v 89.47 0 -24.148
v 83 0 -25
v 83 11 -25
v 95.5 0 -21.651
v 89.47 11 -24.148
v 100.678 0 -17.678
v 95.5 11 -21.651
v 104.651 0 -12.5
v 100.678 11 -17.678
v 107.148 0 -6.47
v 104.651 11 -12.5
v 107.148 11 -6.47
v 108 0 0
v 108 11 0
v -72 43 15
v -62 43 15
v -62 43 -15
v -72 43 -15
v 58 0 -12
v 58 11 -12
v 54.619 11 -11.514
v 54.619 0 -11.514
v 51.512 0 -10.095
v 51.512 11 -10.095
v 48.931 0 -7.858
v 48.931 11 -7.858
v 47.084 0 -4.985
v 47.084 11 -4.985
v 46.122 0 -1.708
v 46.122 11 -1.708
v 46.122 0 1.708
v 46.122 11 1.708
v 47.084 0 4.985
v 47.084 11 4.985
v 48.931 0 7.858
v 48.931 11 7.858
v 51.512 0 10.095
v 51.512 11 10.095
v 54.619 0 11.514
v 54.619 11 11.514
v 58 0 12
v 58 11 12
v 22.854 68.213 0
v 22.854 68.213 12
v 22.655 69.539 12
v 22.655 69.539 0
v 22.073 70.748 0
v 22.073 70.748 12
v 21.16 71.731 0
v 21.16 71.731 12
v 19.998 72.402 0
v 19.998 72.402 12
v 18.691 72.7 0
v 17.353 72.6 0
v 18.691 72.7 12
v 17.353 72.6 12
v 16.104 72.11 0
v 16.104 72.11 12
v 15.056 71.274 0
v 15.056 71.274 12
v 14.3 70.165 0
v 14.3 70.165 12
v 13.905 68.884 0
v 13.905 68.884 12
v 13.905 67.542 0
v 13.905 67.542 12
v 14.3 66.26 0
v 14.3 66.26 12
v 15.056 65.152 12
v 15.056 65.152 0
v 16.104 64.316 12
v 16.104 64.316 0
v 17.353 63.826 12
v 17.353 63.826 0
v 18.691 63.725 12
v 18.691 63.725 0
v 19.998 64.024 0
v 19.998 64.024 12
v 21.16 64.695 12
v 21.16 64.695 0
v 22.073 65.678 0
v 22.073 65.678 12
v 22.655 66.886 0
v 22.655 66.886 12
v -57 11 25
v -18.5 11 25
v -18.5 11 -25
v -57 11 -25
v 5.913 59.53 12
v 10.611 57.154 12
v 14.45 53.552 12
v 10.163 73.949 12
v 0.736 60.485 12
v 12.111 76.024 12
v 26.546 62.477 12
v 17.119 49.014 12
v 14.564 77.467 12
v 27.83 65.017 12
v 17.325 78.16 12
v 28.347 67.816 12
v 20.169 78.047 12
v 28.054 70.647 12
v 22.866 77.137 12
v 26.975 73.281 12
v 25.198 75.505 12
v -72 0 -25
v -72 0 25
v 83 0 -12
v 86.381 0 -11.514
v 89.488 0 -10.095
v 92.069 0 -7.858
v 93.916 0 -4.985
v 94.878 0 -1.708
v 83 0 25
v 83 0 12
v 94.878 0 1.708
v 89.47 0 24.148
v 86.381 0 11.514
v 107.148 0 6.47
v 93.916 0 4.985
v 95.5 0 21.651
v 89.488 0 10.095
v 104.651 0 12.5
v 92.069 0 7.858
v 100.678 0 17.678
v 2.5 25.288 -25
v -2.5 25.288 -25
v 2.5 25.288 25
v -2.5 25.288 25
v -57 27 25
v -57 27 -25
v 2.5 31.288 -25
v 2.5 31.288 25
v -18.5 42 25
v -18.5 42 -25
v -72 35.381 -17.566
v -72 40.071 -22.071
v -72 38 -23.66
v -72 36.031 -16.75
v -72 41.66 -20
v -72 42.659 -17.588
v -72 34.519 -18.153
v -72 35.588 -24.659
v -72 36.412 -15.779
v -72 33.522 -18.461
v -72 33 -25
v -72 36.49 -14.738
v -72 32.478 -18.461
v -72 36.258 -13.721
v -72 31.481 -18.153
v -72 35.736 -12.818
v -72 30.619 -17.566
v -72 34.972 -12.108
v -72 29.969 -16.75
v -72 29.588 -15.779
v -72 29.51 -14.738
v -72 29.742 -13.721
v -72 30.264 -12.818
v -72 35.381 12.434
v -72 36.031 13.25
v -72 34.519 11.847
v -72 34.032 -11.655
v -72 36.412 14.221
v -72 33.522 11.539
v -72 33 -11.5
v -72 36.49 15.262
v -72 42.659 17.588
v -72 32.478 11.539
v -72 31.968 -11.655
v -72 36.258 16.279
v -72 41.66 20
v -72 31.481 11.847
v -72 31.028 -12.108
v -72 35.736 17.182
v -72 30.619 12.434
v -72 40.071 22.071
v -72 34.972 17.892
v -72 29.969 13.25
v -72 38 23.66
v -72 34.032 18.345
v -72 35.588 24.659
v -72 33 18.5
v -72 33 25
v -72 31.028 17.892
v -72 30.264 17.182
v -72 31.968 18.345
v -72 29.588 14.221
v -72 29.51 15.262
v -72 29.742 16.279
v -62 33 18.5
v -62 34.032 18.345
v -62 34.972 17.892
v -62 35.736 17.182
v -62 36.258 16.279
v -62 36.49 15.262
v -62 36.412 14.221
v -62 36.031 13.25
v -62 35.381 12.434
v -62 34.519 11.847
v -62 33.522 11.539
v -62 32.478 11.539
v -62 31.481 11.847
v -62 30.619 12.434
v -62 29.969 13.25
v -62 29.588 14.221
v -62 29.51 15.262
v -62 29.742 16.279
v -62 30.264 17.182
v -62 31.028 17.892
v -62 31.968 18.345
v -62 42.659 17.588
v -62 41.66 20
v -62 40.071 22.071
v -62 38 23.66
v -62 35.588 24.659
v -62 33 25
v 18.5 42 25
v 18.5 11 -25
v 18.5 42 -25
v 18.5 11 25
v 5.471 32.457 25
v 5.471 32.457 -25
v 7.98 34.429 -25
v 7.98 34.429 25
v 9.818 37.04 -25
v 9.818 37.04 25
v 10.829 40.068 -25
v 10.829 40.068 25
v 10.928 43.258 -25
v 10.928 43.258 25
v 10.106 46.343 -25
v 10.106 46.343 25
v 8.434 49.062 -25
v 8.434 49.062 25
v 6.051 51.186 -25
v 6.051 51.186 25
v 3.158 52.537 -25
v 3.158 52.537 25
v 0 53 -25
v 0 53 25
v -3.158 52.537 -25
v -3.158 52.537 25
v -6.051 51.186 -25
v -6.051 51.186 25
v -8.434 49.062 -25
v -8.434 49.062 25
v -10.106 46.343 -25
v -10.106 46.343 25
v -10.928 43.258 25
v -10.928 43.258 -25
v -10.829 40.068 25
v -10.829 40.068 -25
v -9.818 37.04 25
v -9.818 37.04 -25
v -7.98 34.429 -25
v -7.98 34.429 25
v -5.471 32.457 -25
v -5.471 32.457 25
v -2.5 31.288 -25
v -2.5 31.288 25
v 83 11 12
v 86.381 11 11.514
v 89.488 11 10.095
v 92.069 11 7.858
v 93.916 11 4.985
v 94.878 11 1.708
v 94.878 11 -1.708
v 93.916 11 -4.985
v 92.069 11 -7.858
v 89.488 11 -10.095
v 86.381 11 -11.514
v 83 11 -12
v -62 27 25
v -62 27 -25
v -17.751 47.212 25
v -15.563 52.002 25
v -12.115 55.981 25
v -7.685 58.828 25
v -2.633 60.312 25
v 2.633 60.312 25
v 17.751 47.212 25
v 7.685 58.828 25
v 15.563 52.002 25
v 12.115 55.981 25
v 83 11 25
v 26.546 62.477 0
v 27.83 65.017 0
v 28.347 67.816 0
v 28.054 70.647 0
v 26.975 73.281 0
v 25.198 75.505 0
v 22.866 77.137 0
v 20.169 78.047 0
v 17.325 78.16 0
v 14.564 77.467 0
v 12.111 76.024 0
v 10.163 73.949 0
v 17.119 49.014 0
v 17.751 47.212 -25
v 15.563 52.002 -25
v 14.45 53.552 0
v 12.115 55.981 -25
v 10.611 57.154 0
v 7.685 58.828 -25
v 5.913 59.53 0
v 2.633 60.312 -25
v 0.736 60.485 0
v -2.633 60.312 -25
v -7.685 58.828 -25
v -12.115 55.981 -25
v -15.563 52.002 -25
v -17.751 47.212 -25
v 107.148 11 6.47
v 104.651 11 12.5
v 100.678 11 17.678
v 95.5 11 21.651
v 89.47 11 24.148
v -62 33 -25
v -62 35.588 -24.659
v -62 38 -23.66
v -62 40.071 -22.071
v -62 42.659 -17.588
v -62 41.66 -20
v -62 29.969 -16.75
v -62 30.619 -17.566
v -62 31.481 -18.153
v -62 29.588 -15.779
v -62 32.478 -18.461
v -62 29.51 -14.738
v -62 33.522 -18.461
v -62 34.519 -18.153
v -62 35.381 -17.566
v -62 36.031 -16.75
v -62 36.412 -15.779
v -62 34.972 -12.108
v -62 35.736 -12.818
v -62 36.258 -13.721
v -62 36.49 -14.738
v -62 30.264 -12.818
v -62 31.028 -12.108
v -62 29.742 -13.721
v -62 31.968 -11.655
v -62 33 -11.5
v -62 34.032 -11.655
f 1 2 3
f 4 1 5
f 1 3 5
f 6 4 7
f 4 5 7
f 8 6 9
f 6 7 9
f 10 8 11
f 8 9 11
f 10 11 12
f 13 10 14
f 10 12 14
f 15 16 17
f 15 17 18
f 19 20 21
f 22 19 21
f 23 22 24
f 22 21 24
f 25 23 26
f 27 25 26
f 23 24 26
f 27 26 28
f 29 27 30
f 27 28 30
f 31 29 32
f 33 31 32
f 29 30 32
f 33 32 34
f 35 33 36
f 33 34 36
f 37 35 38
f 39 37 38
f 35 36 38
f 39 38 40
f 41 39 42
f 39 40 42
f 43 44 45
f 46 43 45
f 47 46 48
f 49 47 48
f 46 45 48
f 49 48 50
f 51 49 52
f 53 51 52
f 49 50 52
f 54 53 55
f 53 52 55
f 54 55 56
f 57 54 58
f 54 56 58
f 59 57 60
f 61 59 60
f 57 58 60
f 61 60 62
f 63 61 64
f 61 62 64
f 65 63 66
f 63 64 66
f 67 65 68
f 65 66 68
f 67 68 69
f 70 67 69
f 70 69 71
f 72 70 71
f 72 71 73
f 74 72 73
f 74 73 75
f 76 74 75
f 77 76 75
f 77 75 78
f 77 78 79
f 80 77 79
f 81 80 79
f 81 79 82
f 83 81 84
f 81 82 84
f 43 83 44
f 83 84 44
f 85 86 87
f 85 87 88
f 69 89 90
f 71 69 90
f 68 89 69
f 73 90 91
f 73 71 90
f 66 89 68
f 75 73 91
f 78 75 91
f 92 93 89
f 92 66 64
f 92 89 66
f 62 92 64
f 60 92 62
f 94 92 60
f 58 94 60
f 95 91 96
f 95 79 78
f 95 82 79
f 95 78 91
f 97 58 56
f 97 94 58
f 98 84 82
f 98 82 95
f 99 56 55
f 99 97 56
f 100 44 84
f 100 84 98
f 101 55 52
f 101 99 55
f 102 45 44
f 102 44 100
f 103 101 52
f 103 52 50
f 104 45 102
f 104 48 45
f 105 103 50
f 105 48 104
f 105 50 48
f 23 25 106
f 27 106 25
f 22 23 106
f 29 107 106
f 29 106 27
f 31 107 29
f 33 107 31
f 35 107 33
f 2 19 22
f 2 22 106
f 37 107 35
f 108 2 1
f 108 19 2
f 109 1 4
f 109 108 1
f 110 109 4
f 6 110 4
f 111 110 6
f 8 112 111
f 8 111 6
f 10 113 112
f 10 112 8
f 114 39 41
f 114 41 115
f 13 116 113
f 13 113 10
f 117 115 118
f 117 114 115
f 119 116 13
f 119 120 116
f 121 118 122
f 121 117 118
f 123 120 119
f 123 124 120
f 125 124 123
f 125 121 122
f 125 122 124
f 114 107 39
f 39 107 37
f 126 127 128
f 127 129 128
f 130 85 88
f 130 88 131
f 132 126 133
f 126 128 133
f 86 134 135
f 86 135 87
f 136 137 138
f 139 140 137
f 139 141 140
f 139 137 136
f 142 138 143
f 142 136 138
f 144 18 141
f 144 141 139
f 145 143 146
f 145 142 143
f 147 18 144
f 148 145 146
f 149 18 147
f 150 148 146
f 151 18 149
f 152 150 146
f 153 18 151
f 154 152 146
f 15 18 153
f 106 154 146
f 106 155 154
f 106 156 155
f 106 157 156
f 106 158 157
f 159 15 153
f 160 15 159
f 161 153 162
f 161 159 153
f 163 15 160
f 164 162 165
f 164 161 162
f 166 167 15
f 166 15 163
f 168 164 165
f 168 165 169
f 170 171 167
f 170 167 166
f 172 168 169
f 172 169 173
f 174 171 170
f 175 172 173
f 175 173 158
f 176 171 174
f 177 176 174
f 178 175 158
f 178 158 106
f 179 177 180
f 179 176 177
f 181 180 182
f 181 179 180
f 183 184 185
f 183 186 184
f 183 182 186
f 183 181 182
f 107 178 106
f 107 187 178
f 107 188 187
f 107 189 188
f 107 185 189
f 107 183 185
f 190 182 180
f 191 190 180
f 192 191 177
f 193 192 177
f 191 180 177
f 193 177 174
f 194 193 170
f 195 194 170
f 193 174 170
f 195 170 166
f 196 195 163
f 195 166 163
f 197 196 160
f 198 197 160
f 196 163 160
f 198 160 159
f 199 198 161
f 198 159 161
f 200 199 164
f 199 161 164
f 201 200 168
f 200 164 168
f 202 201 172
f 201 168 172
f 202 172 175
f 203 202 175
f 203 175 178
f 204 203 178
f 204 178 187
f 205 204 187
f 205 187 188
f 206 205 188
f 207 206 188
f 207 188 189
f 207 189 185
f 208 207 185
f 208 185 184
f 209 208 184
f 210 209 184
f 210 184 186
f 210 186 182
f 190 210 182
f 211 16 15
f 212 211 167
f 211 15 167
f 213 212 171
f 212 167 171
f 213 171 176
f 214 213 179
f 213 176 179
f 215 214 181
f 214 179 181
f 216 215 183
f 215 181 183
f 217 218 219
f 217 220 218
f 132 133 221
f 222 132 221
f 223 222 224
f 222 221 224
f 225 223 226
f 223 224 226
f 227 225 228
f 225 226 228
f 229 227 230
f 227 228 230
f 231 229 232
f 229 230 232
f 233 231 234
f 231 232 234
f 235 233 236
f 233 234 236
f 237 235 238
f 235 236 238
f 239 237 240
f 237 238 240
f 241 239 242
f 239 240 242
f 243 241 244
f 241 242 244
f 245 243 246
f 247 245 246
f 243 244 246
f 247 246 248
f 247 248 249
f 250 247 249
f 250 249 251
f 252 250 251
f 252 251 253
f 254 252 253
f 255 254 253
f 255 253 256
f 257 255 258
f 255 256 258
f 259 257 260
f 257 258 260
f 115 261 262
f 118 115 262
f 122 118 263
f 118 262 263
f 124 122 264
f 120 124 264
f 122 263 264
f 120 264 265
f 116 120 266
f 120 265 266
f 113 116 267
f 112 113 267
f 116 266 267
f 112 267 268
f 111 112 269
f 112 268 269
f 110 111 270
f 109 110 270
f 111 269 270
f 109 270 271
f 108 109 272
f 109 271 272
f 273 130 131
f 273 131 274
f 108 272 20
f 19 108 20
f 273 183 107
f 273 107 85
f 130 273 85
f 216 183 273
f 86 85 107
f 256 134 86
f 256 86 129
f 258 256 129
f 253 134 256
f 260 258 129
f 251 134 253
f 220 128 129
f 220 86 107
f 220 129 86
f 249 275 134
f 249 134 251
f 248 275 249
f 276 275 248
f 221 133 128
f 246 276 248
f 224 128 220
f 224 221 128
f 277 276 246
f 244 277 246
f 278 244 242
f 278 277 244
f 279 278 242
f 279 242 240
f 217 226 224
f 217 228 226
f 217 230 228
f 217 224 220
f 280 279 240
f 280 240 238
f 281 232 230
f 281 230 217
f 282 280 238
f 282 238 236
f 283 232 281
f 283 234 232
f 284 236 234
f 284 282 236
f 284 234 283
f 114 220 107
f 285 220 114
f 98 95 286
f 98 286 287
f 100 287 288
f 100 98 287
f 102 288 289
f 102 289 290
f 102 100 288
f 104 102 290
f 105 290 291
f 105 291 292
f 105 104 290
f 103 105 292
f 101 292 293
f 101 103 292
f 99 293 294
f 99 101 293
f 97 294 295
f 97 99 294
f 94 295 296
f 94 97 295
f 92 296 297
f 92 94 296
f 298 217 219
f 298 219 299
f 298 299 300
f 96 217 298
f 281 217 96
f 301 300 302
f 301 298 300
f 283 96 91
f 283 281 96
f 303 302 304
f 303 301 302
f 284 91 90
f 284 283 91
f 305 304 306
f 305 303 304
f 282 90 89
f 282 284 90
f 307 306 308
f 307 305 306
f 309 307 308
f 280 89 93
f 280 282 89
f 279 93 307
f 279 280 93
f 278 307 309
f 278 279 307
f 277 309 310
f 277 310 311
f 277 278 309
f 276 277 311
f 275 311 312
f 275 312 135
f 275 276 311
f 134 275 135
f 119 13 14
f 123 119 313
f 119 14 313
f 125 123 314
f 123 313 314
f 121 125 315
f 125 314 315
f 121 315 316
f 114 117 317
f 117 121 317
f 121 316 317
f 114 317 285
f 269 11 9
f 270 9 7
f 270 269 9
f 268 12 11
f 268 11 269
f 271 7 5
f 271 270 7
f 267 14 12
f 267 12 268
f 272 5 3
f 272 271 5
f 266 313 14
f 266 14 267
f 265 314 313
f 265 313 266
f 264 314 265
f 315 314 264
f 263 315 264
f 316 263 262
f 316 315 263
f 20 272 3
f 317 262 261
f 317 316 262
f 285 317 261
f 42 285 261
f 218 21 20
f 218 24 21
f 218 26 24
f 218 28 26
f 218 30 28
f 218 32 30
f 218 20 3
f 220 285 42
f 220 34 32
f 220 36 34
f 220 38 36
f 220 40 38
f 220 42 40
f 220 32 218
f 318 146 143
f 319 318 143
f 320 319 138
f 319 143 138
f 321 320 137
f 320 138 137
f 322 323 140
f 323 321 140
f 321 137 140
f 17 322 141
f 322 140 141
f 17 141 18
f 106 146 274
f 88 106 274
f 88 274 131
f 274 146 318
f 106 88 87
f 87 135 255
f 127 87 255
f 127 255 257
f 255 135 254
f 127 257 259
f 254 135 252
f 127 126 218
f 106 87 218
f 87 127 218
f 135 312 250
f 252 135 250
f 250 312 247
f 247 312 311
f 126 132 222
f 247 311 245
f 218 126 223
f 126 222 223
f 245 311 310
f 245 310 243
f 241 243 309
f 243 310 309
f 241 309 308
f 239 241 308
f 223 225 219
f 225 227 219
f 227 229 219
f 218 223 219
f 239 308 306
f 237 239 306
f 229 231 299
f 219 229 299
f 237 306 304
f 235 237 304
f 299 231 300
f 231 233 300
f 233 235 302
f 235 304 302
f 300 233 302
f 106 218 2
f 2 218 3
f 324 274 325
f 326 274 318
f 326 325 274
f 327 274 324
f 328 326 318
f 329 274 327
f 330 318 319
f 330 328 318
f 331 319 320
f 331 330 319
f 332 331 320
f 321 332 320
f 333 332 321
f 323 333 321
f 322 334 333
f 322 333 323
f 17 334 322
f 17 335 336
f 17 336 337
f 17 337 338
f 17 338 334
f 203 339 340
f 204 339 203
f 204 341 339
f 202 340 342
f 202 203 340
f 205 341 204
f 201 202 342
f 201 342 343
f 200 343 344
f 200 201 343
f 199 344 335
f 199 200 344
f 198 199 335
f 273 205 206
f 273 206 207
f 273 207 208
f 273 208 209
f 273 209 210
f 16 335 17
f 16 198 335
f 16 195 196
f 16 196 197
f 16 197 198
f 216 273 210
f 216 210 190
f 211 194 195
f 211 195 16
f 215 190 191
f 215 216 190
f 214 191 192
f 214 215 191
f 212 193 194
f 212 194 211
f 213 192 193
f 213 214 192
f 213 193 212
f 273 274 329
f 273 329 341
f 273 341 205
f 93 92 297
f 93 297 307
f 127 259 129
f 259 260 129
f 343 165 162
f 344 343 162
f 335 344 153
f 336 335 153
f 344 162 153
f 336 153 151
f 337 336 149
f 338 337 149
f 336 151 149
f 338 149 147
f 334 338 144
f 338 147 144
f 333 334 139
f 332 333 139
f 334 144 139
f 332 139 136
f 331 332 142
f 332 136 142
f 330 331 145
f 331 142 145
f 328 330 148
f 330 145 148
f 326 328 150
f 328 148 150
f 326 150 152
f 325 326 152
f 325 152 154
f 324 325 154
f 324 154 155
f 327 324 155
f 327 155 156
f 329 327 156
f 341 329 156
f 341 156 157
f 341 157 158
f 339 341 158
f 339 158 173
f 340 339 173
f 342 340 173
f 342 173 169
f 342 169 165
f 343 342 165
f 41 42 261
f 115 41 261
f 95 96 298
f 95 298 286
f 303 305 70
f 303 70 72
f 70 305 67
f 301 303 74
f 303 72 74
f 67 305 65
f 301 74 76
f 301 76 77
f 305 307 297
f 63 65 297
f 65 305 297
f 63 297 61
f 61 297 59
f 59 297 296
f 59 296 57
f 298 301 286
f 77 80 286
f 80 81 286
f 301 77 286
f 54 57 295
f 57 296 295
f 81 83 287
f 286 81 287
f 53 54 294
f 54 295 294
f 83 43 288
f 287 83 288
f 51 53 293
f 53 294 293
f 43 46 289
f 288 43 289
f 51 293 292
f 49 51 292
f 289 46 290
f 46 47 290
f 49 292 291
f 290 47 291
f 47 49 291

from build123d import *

# Parameters (mm, degrees)
BOSS_EXTRUDE1_DEPTH = 25
SKETCH1_3_R         = 4.5
BOSS_EXTRUDE2_DEPTH = 12
CUT_EXTRUDE1_REACH  = 131.64
CUT_EXTRUDE2_REACH  = 199.844
SKETCH3_R           = 3.5


with BuildPart() as part:
    # Sketch1 → Boss-Extrude1 (new, symmetric)
    with BuildSketch(Plane.XY):
        with BuildLine():
            Line((-72, 43), (-72, 0))
            Line((-72, 0), (108, 0))
            Line((108, 0), (108, 11))
            Line((108, 11), (18.5, 11))
            Line((18.5, 11), (18.5, 42))
            ThreePointArc((18.5, 42), (18.151437184, 45.574259105), (17.118883443, 49.013831311))
            ThreePointArc((17.118883443, 49.013831311), (10.611164072, 57.154312819), (0.735842557, 60.485360038))
            ThreePointArc((0.735842557, 60.485360038), (-12.818676076, 55.339098307), (-18.5, 42))
            Line((-18.5, 42), (-18.5, 11))
            Line((-18.5, 11), (-57, 11))
            Line((-57, 11), (-57, 27))
            Line((-57, 27), (-62, 27))
            Line((-62, 27), (-62, 43))
            Line((-62, 43), (-72, 43))
        make_face()
        with BuildLine():
            Line((-2.5, 25.287857357), (-2.5, 31.287857357))
            ThreePointArc((-2.5, 31.287857357), (0, 53), (2.5, 31.287857357))
            Line((2.5, 31.287857357), (2.5, 25.287857357))
            Line((2.5, 25.287857357), (-2.5, 25.287857357))
        make_face(mode=Mode.SUBTRACT)
    extrude(amount=BOSS_EXTRUDE1_DEPTH, both=True)

    # Sketch1<3> → Boss-Extrude2 (add)
    with BuildSketch(Plane.XY):
        with BuildLine():
            ThreePointArc((0.735842557, 60.485360038), (10.611164072, 57.154312819), (17.118883443, 49.013831311))
            Line((17.118883443, 49.013831311), (26.545966406, 62.477101054))
            ThreePointArc((26.545966406, 62.477101054), (24.090210327, 76.40438586), (10.16292552, 73.948629781))
            Line((10.16292552, 73.948629781), (0.735842557, 60.485360038))
        make_face()
        with Locations((18.354445963, 68.212865417)):
            Circle(SKETCH1_3_R, mode=Mode.SUBTRACT)
    extrude(amount=BOSS_EXTRUDE2_DEPTH)

    # Sketch2 → Cut-Extrude1 (cut, up to next)
    with BuildSketch(Plane(origin=(0, 11, 0), x_dir=(1, 0, 0), z_dir=(0, 1, 0)), mode=Mode.PRIVATE) as cut_extrude1_sk1:
        with BuildLine():
            Line((83, 12), (58, 12))
            ThreePointArc((58, 12), (46, 0), (58, -12))
            Line((58, -12), (83, -12))
            ThreePointArc((83, -12), (95, 0), (83, 12))
        make_face()
    cut_extrude1_tool1 = extrude(cut_extrude1_sk1.sketch, amount=-CUT_EXTRUDE1_REACH, mode=Mode.PRIVATE) & part.part
    # Sketch2 → Cut-Extrude1 (cut, up to next)
    with BuildSketch(Plane(origin=(0, 11, 0), x_dir=(1, 0, 0), z_dir=(0, 1, 0)), mode=Mode.PRIVATE) as cut_extrude1_sk2:
        with BuildLine():
            ThreePointArc((83, 25), (100.677669542, 17.677669518), (108, -3.4e-08))
            Line((108, -3.4e-08), (108, 25))
            Line((108, 25), (83, 25))
        make_face()
    cut_extrude1_tool2 = extrude(cut_extrude1_sk2.sketch, amount=-CUT_EXTRUDE1_REACH, mode=Mode.PRIVATE) & part.part
    # Sketch2 → Cut-Extrude1 (cut, up to next)
    with BuildSketch(Plane(origin=(0, 11, 0), x_dir=(1, 0, 0), z_dir=(0, 1, 0)), mode=Mode.PRIVATE) as cut_extrude1_sk3:
        with BuildLine():
            ThreePointArc((108, -3.4e-08), (100.677669518, -17.677669542), (83, -25))
            Line((83, -25), (108, -25))
            Line((108, -25), (108, -3.4e-08))
        make_face()
    cut_extrude1_tool3 = extrude(cut_extrude1_sk3.sketch, amount=-CUT_EXTRUDE1_REACH, mode=Mode.PRIVATE) & part.part
    add(cut_extrude1_tool1.solids().sort_by_distance((70.5, 11, 0))[0], mode=Mode.SUBTRACT)
    add(cut_extrude1_tool2.solids().sort_by_distance((102.415802, 11, -19.415802))[0], mode=Mode.SUBTRACT)
    add(cut_extrude1_tool3.solids().sort_by_distance((102.415802, 11, 19.415802))[0], mode=Mode.SUBTRACT)

    # Sketch3 → Cut-Extrude2 (cut, up to next)
    with BuildSketch(Plane.ZY.offset(72), mode=Mode.PRIVATE) as cut_extrude2_sk1:
        with BuildLine():
            ThreePointArc((-25, 33), (-22.071067778, 40.071067846), (-14.999999905, 43))
            Line((-14.999999905, 43), (-25, 43))
            Line((-25, 43), (-25, 33))
        make_face()
    cut_extrude2_tool1 = extrude(cut_extrude2_sk1.sketch, amount=-CUT_EXTRUDE2_REACH, mode=Mode.PRIVATE) & part.part
    # Sketch3 → Cut-Extrude2 (cut, up to next)
    with BuildSketch(Plane.ZY.offset(72), mode=Mode.PRIVATE) as cut_extrude2_sk2:
        with BuildLine():
            ThreePointArc((15, 43), (22.071067812, 40.071067812), (25, 33))
            Line((25, 33), (25, 43))
            Line((25, 43), (15, 43))
        make_face()
    cut_extrude2_tool2 = extrude(cut_extrude2_sk2.sketch, amount=-CUT_EXTRUDE2_REACH, mode=Mode.PRIVATE) & part.part
    # Sketch3 → Cut-Extrude2 (cut, up to next)
    with BuildSketch(Plane.ZY.offset(72), mode=Mode.PRIVATE) as cut_extrude2_sk3:
        with Locations((15, 33)):
            Circle(SKETCH3_R)
    cut_extrude2_tool3 = extrude(cut_extrude2_sk3.sketch, amount=-CUT_EXTRUDE2_REACH, mode=Mode.PRIVATE) & part.part
    # Sketch3 → Cut-Extrude2 (cut, up to next)
    with BuildSketch(Plane.ZY.offset(72), mode=Mode.PRIVATE) as cut_extrude2_sk4:
        with Locations((-15, 33)):
            Circle(SKETCH3_R)
    cut_extrude2_tool4 = extrude(cut_extrude2_sk4.sketch, amount=-CUT_EXTRUDE2_REACH, mode=Mode.PRIVATE) & part.part
    add(cut_extrude2_tool1.solids().sort_by_distance((-72, 40.766321, -22.766321))[0], mode=Mode.SUBTRACT)
    add(cut_extrude2_tool2.solids().sort_by_distance((-72, 40.766321, 22.766321))[0], mode=Mode.SUBTRACT)
    add(cut_extrude2_tool3.solids().sort_by_distance((-72, 33, 15))[0], mode=Mode.SUBTRACT)
    add(cut_extrude2_tool4.solids().sort_by_distance((-72, 33, -15))[0], mode=Mode.SUBTRACT)


solid = part.part
